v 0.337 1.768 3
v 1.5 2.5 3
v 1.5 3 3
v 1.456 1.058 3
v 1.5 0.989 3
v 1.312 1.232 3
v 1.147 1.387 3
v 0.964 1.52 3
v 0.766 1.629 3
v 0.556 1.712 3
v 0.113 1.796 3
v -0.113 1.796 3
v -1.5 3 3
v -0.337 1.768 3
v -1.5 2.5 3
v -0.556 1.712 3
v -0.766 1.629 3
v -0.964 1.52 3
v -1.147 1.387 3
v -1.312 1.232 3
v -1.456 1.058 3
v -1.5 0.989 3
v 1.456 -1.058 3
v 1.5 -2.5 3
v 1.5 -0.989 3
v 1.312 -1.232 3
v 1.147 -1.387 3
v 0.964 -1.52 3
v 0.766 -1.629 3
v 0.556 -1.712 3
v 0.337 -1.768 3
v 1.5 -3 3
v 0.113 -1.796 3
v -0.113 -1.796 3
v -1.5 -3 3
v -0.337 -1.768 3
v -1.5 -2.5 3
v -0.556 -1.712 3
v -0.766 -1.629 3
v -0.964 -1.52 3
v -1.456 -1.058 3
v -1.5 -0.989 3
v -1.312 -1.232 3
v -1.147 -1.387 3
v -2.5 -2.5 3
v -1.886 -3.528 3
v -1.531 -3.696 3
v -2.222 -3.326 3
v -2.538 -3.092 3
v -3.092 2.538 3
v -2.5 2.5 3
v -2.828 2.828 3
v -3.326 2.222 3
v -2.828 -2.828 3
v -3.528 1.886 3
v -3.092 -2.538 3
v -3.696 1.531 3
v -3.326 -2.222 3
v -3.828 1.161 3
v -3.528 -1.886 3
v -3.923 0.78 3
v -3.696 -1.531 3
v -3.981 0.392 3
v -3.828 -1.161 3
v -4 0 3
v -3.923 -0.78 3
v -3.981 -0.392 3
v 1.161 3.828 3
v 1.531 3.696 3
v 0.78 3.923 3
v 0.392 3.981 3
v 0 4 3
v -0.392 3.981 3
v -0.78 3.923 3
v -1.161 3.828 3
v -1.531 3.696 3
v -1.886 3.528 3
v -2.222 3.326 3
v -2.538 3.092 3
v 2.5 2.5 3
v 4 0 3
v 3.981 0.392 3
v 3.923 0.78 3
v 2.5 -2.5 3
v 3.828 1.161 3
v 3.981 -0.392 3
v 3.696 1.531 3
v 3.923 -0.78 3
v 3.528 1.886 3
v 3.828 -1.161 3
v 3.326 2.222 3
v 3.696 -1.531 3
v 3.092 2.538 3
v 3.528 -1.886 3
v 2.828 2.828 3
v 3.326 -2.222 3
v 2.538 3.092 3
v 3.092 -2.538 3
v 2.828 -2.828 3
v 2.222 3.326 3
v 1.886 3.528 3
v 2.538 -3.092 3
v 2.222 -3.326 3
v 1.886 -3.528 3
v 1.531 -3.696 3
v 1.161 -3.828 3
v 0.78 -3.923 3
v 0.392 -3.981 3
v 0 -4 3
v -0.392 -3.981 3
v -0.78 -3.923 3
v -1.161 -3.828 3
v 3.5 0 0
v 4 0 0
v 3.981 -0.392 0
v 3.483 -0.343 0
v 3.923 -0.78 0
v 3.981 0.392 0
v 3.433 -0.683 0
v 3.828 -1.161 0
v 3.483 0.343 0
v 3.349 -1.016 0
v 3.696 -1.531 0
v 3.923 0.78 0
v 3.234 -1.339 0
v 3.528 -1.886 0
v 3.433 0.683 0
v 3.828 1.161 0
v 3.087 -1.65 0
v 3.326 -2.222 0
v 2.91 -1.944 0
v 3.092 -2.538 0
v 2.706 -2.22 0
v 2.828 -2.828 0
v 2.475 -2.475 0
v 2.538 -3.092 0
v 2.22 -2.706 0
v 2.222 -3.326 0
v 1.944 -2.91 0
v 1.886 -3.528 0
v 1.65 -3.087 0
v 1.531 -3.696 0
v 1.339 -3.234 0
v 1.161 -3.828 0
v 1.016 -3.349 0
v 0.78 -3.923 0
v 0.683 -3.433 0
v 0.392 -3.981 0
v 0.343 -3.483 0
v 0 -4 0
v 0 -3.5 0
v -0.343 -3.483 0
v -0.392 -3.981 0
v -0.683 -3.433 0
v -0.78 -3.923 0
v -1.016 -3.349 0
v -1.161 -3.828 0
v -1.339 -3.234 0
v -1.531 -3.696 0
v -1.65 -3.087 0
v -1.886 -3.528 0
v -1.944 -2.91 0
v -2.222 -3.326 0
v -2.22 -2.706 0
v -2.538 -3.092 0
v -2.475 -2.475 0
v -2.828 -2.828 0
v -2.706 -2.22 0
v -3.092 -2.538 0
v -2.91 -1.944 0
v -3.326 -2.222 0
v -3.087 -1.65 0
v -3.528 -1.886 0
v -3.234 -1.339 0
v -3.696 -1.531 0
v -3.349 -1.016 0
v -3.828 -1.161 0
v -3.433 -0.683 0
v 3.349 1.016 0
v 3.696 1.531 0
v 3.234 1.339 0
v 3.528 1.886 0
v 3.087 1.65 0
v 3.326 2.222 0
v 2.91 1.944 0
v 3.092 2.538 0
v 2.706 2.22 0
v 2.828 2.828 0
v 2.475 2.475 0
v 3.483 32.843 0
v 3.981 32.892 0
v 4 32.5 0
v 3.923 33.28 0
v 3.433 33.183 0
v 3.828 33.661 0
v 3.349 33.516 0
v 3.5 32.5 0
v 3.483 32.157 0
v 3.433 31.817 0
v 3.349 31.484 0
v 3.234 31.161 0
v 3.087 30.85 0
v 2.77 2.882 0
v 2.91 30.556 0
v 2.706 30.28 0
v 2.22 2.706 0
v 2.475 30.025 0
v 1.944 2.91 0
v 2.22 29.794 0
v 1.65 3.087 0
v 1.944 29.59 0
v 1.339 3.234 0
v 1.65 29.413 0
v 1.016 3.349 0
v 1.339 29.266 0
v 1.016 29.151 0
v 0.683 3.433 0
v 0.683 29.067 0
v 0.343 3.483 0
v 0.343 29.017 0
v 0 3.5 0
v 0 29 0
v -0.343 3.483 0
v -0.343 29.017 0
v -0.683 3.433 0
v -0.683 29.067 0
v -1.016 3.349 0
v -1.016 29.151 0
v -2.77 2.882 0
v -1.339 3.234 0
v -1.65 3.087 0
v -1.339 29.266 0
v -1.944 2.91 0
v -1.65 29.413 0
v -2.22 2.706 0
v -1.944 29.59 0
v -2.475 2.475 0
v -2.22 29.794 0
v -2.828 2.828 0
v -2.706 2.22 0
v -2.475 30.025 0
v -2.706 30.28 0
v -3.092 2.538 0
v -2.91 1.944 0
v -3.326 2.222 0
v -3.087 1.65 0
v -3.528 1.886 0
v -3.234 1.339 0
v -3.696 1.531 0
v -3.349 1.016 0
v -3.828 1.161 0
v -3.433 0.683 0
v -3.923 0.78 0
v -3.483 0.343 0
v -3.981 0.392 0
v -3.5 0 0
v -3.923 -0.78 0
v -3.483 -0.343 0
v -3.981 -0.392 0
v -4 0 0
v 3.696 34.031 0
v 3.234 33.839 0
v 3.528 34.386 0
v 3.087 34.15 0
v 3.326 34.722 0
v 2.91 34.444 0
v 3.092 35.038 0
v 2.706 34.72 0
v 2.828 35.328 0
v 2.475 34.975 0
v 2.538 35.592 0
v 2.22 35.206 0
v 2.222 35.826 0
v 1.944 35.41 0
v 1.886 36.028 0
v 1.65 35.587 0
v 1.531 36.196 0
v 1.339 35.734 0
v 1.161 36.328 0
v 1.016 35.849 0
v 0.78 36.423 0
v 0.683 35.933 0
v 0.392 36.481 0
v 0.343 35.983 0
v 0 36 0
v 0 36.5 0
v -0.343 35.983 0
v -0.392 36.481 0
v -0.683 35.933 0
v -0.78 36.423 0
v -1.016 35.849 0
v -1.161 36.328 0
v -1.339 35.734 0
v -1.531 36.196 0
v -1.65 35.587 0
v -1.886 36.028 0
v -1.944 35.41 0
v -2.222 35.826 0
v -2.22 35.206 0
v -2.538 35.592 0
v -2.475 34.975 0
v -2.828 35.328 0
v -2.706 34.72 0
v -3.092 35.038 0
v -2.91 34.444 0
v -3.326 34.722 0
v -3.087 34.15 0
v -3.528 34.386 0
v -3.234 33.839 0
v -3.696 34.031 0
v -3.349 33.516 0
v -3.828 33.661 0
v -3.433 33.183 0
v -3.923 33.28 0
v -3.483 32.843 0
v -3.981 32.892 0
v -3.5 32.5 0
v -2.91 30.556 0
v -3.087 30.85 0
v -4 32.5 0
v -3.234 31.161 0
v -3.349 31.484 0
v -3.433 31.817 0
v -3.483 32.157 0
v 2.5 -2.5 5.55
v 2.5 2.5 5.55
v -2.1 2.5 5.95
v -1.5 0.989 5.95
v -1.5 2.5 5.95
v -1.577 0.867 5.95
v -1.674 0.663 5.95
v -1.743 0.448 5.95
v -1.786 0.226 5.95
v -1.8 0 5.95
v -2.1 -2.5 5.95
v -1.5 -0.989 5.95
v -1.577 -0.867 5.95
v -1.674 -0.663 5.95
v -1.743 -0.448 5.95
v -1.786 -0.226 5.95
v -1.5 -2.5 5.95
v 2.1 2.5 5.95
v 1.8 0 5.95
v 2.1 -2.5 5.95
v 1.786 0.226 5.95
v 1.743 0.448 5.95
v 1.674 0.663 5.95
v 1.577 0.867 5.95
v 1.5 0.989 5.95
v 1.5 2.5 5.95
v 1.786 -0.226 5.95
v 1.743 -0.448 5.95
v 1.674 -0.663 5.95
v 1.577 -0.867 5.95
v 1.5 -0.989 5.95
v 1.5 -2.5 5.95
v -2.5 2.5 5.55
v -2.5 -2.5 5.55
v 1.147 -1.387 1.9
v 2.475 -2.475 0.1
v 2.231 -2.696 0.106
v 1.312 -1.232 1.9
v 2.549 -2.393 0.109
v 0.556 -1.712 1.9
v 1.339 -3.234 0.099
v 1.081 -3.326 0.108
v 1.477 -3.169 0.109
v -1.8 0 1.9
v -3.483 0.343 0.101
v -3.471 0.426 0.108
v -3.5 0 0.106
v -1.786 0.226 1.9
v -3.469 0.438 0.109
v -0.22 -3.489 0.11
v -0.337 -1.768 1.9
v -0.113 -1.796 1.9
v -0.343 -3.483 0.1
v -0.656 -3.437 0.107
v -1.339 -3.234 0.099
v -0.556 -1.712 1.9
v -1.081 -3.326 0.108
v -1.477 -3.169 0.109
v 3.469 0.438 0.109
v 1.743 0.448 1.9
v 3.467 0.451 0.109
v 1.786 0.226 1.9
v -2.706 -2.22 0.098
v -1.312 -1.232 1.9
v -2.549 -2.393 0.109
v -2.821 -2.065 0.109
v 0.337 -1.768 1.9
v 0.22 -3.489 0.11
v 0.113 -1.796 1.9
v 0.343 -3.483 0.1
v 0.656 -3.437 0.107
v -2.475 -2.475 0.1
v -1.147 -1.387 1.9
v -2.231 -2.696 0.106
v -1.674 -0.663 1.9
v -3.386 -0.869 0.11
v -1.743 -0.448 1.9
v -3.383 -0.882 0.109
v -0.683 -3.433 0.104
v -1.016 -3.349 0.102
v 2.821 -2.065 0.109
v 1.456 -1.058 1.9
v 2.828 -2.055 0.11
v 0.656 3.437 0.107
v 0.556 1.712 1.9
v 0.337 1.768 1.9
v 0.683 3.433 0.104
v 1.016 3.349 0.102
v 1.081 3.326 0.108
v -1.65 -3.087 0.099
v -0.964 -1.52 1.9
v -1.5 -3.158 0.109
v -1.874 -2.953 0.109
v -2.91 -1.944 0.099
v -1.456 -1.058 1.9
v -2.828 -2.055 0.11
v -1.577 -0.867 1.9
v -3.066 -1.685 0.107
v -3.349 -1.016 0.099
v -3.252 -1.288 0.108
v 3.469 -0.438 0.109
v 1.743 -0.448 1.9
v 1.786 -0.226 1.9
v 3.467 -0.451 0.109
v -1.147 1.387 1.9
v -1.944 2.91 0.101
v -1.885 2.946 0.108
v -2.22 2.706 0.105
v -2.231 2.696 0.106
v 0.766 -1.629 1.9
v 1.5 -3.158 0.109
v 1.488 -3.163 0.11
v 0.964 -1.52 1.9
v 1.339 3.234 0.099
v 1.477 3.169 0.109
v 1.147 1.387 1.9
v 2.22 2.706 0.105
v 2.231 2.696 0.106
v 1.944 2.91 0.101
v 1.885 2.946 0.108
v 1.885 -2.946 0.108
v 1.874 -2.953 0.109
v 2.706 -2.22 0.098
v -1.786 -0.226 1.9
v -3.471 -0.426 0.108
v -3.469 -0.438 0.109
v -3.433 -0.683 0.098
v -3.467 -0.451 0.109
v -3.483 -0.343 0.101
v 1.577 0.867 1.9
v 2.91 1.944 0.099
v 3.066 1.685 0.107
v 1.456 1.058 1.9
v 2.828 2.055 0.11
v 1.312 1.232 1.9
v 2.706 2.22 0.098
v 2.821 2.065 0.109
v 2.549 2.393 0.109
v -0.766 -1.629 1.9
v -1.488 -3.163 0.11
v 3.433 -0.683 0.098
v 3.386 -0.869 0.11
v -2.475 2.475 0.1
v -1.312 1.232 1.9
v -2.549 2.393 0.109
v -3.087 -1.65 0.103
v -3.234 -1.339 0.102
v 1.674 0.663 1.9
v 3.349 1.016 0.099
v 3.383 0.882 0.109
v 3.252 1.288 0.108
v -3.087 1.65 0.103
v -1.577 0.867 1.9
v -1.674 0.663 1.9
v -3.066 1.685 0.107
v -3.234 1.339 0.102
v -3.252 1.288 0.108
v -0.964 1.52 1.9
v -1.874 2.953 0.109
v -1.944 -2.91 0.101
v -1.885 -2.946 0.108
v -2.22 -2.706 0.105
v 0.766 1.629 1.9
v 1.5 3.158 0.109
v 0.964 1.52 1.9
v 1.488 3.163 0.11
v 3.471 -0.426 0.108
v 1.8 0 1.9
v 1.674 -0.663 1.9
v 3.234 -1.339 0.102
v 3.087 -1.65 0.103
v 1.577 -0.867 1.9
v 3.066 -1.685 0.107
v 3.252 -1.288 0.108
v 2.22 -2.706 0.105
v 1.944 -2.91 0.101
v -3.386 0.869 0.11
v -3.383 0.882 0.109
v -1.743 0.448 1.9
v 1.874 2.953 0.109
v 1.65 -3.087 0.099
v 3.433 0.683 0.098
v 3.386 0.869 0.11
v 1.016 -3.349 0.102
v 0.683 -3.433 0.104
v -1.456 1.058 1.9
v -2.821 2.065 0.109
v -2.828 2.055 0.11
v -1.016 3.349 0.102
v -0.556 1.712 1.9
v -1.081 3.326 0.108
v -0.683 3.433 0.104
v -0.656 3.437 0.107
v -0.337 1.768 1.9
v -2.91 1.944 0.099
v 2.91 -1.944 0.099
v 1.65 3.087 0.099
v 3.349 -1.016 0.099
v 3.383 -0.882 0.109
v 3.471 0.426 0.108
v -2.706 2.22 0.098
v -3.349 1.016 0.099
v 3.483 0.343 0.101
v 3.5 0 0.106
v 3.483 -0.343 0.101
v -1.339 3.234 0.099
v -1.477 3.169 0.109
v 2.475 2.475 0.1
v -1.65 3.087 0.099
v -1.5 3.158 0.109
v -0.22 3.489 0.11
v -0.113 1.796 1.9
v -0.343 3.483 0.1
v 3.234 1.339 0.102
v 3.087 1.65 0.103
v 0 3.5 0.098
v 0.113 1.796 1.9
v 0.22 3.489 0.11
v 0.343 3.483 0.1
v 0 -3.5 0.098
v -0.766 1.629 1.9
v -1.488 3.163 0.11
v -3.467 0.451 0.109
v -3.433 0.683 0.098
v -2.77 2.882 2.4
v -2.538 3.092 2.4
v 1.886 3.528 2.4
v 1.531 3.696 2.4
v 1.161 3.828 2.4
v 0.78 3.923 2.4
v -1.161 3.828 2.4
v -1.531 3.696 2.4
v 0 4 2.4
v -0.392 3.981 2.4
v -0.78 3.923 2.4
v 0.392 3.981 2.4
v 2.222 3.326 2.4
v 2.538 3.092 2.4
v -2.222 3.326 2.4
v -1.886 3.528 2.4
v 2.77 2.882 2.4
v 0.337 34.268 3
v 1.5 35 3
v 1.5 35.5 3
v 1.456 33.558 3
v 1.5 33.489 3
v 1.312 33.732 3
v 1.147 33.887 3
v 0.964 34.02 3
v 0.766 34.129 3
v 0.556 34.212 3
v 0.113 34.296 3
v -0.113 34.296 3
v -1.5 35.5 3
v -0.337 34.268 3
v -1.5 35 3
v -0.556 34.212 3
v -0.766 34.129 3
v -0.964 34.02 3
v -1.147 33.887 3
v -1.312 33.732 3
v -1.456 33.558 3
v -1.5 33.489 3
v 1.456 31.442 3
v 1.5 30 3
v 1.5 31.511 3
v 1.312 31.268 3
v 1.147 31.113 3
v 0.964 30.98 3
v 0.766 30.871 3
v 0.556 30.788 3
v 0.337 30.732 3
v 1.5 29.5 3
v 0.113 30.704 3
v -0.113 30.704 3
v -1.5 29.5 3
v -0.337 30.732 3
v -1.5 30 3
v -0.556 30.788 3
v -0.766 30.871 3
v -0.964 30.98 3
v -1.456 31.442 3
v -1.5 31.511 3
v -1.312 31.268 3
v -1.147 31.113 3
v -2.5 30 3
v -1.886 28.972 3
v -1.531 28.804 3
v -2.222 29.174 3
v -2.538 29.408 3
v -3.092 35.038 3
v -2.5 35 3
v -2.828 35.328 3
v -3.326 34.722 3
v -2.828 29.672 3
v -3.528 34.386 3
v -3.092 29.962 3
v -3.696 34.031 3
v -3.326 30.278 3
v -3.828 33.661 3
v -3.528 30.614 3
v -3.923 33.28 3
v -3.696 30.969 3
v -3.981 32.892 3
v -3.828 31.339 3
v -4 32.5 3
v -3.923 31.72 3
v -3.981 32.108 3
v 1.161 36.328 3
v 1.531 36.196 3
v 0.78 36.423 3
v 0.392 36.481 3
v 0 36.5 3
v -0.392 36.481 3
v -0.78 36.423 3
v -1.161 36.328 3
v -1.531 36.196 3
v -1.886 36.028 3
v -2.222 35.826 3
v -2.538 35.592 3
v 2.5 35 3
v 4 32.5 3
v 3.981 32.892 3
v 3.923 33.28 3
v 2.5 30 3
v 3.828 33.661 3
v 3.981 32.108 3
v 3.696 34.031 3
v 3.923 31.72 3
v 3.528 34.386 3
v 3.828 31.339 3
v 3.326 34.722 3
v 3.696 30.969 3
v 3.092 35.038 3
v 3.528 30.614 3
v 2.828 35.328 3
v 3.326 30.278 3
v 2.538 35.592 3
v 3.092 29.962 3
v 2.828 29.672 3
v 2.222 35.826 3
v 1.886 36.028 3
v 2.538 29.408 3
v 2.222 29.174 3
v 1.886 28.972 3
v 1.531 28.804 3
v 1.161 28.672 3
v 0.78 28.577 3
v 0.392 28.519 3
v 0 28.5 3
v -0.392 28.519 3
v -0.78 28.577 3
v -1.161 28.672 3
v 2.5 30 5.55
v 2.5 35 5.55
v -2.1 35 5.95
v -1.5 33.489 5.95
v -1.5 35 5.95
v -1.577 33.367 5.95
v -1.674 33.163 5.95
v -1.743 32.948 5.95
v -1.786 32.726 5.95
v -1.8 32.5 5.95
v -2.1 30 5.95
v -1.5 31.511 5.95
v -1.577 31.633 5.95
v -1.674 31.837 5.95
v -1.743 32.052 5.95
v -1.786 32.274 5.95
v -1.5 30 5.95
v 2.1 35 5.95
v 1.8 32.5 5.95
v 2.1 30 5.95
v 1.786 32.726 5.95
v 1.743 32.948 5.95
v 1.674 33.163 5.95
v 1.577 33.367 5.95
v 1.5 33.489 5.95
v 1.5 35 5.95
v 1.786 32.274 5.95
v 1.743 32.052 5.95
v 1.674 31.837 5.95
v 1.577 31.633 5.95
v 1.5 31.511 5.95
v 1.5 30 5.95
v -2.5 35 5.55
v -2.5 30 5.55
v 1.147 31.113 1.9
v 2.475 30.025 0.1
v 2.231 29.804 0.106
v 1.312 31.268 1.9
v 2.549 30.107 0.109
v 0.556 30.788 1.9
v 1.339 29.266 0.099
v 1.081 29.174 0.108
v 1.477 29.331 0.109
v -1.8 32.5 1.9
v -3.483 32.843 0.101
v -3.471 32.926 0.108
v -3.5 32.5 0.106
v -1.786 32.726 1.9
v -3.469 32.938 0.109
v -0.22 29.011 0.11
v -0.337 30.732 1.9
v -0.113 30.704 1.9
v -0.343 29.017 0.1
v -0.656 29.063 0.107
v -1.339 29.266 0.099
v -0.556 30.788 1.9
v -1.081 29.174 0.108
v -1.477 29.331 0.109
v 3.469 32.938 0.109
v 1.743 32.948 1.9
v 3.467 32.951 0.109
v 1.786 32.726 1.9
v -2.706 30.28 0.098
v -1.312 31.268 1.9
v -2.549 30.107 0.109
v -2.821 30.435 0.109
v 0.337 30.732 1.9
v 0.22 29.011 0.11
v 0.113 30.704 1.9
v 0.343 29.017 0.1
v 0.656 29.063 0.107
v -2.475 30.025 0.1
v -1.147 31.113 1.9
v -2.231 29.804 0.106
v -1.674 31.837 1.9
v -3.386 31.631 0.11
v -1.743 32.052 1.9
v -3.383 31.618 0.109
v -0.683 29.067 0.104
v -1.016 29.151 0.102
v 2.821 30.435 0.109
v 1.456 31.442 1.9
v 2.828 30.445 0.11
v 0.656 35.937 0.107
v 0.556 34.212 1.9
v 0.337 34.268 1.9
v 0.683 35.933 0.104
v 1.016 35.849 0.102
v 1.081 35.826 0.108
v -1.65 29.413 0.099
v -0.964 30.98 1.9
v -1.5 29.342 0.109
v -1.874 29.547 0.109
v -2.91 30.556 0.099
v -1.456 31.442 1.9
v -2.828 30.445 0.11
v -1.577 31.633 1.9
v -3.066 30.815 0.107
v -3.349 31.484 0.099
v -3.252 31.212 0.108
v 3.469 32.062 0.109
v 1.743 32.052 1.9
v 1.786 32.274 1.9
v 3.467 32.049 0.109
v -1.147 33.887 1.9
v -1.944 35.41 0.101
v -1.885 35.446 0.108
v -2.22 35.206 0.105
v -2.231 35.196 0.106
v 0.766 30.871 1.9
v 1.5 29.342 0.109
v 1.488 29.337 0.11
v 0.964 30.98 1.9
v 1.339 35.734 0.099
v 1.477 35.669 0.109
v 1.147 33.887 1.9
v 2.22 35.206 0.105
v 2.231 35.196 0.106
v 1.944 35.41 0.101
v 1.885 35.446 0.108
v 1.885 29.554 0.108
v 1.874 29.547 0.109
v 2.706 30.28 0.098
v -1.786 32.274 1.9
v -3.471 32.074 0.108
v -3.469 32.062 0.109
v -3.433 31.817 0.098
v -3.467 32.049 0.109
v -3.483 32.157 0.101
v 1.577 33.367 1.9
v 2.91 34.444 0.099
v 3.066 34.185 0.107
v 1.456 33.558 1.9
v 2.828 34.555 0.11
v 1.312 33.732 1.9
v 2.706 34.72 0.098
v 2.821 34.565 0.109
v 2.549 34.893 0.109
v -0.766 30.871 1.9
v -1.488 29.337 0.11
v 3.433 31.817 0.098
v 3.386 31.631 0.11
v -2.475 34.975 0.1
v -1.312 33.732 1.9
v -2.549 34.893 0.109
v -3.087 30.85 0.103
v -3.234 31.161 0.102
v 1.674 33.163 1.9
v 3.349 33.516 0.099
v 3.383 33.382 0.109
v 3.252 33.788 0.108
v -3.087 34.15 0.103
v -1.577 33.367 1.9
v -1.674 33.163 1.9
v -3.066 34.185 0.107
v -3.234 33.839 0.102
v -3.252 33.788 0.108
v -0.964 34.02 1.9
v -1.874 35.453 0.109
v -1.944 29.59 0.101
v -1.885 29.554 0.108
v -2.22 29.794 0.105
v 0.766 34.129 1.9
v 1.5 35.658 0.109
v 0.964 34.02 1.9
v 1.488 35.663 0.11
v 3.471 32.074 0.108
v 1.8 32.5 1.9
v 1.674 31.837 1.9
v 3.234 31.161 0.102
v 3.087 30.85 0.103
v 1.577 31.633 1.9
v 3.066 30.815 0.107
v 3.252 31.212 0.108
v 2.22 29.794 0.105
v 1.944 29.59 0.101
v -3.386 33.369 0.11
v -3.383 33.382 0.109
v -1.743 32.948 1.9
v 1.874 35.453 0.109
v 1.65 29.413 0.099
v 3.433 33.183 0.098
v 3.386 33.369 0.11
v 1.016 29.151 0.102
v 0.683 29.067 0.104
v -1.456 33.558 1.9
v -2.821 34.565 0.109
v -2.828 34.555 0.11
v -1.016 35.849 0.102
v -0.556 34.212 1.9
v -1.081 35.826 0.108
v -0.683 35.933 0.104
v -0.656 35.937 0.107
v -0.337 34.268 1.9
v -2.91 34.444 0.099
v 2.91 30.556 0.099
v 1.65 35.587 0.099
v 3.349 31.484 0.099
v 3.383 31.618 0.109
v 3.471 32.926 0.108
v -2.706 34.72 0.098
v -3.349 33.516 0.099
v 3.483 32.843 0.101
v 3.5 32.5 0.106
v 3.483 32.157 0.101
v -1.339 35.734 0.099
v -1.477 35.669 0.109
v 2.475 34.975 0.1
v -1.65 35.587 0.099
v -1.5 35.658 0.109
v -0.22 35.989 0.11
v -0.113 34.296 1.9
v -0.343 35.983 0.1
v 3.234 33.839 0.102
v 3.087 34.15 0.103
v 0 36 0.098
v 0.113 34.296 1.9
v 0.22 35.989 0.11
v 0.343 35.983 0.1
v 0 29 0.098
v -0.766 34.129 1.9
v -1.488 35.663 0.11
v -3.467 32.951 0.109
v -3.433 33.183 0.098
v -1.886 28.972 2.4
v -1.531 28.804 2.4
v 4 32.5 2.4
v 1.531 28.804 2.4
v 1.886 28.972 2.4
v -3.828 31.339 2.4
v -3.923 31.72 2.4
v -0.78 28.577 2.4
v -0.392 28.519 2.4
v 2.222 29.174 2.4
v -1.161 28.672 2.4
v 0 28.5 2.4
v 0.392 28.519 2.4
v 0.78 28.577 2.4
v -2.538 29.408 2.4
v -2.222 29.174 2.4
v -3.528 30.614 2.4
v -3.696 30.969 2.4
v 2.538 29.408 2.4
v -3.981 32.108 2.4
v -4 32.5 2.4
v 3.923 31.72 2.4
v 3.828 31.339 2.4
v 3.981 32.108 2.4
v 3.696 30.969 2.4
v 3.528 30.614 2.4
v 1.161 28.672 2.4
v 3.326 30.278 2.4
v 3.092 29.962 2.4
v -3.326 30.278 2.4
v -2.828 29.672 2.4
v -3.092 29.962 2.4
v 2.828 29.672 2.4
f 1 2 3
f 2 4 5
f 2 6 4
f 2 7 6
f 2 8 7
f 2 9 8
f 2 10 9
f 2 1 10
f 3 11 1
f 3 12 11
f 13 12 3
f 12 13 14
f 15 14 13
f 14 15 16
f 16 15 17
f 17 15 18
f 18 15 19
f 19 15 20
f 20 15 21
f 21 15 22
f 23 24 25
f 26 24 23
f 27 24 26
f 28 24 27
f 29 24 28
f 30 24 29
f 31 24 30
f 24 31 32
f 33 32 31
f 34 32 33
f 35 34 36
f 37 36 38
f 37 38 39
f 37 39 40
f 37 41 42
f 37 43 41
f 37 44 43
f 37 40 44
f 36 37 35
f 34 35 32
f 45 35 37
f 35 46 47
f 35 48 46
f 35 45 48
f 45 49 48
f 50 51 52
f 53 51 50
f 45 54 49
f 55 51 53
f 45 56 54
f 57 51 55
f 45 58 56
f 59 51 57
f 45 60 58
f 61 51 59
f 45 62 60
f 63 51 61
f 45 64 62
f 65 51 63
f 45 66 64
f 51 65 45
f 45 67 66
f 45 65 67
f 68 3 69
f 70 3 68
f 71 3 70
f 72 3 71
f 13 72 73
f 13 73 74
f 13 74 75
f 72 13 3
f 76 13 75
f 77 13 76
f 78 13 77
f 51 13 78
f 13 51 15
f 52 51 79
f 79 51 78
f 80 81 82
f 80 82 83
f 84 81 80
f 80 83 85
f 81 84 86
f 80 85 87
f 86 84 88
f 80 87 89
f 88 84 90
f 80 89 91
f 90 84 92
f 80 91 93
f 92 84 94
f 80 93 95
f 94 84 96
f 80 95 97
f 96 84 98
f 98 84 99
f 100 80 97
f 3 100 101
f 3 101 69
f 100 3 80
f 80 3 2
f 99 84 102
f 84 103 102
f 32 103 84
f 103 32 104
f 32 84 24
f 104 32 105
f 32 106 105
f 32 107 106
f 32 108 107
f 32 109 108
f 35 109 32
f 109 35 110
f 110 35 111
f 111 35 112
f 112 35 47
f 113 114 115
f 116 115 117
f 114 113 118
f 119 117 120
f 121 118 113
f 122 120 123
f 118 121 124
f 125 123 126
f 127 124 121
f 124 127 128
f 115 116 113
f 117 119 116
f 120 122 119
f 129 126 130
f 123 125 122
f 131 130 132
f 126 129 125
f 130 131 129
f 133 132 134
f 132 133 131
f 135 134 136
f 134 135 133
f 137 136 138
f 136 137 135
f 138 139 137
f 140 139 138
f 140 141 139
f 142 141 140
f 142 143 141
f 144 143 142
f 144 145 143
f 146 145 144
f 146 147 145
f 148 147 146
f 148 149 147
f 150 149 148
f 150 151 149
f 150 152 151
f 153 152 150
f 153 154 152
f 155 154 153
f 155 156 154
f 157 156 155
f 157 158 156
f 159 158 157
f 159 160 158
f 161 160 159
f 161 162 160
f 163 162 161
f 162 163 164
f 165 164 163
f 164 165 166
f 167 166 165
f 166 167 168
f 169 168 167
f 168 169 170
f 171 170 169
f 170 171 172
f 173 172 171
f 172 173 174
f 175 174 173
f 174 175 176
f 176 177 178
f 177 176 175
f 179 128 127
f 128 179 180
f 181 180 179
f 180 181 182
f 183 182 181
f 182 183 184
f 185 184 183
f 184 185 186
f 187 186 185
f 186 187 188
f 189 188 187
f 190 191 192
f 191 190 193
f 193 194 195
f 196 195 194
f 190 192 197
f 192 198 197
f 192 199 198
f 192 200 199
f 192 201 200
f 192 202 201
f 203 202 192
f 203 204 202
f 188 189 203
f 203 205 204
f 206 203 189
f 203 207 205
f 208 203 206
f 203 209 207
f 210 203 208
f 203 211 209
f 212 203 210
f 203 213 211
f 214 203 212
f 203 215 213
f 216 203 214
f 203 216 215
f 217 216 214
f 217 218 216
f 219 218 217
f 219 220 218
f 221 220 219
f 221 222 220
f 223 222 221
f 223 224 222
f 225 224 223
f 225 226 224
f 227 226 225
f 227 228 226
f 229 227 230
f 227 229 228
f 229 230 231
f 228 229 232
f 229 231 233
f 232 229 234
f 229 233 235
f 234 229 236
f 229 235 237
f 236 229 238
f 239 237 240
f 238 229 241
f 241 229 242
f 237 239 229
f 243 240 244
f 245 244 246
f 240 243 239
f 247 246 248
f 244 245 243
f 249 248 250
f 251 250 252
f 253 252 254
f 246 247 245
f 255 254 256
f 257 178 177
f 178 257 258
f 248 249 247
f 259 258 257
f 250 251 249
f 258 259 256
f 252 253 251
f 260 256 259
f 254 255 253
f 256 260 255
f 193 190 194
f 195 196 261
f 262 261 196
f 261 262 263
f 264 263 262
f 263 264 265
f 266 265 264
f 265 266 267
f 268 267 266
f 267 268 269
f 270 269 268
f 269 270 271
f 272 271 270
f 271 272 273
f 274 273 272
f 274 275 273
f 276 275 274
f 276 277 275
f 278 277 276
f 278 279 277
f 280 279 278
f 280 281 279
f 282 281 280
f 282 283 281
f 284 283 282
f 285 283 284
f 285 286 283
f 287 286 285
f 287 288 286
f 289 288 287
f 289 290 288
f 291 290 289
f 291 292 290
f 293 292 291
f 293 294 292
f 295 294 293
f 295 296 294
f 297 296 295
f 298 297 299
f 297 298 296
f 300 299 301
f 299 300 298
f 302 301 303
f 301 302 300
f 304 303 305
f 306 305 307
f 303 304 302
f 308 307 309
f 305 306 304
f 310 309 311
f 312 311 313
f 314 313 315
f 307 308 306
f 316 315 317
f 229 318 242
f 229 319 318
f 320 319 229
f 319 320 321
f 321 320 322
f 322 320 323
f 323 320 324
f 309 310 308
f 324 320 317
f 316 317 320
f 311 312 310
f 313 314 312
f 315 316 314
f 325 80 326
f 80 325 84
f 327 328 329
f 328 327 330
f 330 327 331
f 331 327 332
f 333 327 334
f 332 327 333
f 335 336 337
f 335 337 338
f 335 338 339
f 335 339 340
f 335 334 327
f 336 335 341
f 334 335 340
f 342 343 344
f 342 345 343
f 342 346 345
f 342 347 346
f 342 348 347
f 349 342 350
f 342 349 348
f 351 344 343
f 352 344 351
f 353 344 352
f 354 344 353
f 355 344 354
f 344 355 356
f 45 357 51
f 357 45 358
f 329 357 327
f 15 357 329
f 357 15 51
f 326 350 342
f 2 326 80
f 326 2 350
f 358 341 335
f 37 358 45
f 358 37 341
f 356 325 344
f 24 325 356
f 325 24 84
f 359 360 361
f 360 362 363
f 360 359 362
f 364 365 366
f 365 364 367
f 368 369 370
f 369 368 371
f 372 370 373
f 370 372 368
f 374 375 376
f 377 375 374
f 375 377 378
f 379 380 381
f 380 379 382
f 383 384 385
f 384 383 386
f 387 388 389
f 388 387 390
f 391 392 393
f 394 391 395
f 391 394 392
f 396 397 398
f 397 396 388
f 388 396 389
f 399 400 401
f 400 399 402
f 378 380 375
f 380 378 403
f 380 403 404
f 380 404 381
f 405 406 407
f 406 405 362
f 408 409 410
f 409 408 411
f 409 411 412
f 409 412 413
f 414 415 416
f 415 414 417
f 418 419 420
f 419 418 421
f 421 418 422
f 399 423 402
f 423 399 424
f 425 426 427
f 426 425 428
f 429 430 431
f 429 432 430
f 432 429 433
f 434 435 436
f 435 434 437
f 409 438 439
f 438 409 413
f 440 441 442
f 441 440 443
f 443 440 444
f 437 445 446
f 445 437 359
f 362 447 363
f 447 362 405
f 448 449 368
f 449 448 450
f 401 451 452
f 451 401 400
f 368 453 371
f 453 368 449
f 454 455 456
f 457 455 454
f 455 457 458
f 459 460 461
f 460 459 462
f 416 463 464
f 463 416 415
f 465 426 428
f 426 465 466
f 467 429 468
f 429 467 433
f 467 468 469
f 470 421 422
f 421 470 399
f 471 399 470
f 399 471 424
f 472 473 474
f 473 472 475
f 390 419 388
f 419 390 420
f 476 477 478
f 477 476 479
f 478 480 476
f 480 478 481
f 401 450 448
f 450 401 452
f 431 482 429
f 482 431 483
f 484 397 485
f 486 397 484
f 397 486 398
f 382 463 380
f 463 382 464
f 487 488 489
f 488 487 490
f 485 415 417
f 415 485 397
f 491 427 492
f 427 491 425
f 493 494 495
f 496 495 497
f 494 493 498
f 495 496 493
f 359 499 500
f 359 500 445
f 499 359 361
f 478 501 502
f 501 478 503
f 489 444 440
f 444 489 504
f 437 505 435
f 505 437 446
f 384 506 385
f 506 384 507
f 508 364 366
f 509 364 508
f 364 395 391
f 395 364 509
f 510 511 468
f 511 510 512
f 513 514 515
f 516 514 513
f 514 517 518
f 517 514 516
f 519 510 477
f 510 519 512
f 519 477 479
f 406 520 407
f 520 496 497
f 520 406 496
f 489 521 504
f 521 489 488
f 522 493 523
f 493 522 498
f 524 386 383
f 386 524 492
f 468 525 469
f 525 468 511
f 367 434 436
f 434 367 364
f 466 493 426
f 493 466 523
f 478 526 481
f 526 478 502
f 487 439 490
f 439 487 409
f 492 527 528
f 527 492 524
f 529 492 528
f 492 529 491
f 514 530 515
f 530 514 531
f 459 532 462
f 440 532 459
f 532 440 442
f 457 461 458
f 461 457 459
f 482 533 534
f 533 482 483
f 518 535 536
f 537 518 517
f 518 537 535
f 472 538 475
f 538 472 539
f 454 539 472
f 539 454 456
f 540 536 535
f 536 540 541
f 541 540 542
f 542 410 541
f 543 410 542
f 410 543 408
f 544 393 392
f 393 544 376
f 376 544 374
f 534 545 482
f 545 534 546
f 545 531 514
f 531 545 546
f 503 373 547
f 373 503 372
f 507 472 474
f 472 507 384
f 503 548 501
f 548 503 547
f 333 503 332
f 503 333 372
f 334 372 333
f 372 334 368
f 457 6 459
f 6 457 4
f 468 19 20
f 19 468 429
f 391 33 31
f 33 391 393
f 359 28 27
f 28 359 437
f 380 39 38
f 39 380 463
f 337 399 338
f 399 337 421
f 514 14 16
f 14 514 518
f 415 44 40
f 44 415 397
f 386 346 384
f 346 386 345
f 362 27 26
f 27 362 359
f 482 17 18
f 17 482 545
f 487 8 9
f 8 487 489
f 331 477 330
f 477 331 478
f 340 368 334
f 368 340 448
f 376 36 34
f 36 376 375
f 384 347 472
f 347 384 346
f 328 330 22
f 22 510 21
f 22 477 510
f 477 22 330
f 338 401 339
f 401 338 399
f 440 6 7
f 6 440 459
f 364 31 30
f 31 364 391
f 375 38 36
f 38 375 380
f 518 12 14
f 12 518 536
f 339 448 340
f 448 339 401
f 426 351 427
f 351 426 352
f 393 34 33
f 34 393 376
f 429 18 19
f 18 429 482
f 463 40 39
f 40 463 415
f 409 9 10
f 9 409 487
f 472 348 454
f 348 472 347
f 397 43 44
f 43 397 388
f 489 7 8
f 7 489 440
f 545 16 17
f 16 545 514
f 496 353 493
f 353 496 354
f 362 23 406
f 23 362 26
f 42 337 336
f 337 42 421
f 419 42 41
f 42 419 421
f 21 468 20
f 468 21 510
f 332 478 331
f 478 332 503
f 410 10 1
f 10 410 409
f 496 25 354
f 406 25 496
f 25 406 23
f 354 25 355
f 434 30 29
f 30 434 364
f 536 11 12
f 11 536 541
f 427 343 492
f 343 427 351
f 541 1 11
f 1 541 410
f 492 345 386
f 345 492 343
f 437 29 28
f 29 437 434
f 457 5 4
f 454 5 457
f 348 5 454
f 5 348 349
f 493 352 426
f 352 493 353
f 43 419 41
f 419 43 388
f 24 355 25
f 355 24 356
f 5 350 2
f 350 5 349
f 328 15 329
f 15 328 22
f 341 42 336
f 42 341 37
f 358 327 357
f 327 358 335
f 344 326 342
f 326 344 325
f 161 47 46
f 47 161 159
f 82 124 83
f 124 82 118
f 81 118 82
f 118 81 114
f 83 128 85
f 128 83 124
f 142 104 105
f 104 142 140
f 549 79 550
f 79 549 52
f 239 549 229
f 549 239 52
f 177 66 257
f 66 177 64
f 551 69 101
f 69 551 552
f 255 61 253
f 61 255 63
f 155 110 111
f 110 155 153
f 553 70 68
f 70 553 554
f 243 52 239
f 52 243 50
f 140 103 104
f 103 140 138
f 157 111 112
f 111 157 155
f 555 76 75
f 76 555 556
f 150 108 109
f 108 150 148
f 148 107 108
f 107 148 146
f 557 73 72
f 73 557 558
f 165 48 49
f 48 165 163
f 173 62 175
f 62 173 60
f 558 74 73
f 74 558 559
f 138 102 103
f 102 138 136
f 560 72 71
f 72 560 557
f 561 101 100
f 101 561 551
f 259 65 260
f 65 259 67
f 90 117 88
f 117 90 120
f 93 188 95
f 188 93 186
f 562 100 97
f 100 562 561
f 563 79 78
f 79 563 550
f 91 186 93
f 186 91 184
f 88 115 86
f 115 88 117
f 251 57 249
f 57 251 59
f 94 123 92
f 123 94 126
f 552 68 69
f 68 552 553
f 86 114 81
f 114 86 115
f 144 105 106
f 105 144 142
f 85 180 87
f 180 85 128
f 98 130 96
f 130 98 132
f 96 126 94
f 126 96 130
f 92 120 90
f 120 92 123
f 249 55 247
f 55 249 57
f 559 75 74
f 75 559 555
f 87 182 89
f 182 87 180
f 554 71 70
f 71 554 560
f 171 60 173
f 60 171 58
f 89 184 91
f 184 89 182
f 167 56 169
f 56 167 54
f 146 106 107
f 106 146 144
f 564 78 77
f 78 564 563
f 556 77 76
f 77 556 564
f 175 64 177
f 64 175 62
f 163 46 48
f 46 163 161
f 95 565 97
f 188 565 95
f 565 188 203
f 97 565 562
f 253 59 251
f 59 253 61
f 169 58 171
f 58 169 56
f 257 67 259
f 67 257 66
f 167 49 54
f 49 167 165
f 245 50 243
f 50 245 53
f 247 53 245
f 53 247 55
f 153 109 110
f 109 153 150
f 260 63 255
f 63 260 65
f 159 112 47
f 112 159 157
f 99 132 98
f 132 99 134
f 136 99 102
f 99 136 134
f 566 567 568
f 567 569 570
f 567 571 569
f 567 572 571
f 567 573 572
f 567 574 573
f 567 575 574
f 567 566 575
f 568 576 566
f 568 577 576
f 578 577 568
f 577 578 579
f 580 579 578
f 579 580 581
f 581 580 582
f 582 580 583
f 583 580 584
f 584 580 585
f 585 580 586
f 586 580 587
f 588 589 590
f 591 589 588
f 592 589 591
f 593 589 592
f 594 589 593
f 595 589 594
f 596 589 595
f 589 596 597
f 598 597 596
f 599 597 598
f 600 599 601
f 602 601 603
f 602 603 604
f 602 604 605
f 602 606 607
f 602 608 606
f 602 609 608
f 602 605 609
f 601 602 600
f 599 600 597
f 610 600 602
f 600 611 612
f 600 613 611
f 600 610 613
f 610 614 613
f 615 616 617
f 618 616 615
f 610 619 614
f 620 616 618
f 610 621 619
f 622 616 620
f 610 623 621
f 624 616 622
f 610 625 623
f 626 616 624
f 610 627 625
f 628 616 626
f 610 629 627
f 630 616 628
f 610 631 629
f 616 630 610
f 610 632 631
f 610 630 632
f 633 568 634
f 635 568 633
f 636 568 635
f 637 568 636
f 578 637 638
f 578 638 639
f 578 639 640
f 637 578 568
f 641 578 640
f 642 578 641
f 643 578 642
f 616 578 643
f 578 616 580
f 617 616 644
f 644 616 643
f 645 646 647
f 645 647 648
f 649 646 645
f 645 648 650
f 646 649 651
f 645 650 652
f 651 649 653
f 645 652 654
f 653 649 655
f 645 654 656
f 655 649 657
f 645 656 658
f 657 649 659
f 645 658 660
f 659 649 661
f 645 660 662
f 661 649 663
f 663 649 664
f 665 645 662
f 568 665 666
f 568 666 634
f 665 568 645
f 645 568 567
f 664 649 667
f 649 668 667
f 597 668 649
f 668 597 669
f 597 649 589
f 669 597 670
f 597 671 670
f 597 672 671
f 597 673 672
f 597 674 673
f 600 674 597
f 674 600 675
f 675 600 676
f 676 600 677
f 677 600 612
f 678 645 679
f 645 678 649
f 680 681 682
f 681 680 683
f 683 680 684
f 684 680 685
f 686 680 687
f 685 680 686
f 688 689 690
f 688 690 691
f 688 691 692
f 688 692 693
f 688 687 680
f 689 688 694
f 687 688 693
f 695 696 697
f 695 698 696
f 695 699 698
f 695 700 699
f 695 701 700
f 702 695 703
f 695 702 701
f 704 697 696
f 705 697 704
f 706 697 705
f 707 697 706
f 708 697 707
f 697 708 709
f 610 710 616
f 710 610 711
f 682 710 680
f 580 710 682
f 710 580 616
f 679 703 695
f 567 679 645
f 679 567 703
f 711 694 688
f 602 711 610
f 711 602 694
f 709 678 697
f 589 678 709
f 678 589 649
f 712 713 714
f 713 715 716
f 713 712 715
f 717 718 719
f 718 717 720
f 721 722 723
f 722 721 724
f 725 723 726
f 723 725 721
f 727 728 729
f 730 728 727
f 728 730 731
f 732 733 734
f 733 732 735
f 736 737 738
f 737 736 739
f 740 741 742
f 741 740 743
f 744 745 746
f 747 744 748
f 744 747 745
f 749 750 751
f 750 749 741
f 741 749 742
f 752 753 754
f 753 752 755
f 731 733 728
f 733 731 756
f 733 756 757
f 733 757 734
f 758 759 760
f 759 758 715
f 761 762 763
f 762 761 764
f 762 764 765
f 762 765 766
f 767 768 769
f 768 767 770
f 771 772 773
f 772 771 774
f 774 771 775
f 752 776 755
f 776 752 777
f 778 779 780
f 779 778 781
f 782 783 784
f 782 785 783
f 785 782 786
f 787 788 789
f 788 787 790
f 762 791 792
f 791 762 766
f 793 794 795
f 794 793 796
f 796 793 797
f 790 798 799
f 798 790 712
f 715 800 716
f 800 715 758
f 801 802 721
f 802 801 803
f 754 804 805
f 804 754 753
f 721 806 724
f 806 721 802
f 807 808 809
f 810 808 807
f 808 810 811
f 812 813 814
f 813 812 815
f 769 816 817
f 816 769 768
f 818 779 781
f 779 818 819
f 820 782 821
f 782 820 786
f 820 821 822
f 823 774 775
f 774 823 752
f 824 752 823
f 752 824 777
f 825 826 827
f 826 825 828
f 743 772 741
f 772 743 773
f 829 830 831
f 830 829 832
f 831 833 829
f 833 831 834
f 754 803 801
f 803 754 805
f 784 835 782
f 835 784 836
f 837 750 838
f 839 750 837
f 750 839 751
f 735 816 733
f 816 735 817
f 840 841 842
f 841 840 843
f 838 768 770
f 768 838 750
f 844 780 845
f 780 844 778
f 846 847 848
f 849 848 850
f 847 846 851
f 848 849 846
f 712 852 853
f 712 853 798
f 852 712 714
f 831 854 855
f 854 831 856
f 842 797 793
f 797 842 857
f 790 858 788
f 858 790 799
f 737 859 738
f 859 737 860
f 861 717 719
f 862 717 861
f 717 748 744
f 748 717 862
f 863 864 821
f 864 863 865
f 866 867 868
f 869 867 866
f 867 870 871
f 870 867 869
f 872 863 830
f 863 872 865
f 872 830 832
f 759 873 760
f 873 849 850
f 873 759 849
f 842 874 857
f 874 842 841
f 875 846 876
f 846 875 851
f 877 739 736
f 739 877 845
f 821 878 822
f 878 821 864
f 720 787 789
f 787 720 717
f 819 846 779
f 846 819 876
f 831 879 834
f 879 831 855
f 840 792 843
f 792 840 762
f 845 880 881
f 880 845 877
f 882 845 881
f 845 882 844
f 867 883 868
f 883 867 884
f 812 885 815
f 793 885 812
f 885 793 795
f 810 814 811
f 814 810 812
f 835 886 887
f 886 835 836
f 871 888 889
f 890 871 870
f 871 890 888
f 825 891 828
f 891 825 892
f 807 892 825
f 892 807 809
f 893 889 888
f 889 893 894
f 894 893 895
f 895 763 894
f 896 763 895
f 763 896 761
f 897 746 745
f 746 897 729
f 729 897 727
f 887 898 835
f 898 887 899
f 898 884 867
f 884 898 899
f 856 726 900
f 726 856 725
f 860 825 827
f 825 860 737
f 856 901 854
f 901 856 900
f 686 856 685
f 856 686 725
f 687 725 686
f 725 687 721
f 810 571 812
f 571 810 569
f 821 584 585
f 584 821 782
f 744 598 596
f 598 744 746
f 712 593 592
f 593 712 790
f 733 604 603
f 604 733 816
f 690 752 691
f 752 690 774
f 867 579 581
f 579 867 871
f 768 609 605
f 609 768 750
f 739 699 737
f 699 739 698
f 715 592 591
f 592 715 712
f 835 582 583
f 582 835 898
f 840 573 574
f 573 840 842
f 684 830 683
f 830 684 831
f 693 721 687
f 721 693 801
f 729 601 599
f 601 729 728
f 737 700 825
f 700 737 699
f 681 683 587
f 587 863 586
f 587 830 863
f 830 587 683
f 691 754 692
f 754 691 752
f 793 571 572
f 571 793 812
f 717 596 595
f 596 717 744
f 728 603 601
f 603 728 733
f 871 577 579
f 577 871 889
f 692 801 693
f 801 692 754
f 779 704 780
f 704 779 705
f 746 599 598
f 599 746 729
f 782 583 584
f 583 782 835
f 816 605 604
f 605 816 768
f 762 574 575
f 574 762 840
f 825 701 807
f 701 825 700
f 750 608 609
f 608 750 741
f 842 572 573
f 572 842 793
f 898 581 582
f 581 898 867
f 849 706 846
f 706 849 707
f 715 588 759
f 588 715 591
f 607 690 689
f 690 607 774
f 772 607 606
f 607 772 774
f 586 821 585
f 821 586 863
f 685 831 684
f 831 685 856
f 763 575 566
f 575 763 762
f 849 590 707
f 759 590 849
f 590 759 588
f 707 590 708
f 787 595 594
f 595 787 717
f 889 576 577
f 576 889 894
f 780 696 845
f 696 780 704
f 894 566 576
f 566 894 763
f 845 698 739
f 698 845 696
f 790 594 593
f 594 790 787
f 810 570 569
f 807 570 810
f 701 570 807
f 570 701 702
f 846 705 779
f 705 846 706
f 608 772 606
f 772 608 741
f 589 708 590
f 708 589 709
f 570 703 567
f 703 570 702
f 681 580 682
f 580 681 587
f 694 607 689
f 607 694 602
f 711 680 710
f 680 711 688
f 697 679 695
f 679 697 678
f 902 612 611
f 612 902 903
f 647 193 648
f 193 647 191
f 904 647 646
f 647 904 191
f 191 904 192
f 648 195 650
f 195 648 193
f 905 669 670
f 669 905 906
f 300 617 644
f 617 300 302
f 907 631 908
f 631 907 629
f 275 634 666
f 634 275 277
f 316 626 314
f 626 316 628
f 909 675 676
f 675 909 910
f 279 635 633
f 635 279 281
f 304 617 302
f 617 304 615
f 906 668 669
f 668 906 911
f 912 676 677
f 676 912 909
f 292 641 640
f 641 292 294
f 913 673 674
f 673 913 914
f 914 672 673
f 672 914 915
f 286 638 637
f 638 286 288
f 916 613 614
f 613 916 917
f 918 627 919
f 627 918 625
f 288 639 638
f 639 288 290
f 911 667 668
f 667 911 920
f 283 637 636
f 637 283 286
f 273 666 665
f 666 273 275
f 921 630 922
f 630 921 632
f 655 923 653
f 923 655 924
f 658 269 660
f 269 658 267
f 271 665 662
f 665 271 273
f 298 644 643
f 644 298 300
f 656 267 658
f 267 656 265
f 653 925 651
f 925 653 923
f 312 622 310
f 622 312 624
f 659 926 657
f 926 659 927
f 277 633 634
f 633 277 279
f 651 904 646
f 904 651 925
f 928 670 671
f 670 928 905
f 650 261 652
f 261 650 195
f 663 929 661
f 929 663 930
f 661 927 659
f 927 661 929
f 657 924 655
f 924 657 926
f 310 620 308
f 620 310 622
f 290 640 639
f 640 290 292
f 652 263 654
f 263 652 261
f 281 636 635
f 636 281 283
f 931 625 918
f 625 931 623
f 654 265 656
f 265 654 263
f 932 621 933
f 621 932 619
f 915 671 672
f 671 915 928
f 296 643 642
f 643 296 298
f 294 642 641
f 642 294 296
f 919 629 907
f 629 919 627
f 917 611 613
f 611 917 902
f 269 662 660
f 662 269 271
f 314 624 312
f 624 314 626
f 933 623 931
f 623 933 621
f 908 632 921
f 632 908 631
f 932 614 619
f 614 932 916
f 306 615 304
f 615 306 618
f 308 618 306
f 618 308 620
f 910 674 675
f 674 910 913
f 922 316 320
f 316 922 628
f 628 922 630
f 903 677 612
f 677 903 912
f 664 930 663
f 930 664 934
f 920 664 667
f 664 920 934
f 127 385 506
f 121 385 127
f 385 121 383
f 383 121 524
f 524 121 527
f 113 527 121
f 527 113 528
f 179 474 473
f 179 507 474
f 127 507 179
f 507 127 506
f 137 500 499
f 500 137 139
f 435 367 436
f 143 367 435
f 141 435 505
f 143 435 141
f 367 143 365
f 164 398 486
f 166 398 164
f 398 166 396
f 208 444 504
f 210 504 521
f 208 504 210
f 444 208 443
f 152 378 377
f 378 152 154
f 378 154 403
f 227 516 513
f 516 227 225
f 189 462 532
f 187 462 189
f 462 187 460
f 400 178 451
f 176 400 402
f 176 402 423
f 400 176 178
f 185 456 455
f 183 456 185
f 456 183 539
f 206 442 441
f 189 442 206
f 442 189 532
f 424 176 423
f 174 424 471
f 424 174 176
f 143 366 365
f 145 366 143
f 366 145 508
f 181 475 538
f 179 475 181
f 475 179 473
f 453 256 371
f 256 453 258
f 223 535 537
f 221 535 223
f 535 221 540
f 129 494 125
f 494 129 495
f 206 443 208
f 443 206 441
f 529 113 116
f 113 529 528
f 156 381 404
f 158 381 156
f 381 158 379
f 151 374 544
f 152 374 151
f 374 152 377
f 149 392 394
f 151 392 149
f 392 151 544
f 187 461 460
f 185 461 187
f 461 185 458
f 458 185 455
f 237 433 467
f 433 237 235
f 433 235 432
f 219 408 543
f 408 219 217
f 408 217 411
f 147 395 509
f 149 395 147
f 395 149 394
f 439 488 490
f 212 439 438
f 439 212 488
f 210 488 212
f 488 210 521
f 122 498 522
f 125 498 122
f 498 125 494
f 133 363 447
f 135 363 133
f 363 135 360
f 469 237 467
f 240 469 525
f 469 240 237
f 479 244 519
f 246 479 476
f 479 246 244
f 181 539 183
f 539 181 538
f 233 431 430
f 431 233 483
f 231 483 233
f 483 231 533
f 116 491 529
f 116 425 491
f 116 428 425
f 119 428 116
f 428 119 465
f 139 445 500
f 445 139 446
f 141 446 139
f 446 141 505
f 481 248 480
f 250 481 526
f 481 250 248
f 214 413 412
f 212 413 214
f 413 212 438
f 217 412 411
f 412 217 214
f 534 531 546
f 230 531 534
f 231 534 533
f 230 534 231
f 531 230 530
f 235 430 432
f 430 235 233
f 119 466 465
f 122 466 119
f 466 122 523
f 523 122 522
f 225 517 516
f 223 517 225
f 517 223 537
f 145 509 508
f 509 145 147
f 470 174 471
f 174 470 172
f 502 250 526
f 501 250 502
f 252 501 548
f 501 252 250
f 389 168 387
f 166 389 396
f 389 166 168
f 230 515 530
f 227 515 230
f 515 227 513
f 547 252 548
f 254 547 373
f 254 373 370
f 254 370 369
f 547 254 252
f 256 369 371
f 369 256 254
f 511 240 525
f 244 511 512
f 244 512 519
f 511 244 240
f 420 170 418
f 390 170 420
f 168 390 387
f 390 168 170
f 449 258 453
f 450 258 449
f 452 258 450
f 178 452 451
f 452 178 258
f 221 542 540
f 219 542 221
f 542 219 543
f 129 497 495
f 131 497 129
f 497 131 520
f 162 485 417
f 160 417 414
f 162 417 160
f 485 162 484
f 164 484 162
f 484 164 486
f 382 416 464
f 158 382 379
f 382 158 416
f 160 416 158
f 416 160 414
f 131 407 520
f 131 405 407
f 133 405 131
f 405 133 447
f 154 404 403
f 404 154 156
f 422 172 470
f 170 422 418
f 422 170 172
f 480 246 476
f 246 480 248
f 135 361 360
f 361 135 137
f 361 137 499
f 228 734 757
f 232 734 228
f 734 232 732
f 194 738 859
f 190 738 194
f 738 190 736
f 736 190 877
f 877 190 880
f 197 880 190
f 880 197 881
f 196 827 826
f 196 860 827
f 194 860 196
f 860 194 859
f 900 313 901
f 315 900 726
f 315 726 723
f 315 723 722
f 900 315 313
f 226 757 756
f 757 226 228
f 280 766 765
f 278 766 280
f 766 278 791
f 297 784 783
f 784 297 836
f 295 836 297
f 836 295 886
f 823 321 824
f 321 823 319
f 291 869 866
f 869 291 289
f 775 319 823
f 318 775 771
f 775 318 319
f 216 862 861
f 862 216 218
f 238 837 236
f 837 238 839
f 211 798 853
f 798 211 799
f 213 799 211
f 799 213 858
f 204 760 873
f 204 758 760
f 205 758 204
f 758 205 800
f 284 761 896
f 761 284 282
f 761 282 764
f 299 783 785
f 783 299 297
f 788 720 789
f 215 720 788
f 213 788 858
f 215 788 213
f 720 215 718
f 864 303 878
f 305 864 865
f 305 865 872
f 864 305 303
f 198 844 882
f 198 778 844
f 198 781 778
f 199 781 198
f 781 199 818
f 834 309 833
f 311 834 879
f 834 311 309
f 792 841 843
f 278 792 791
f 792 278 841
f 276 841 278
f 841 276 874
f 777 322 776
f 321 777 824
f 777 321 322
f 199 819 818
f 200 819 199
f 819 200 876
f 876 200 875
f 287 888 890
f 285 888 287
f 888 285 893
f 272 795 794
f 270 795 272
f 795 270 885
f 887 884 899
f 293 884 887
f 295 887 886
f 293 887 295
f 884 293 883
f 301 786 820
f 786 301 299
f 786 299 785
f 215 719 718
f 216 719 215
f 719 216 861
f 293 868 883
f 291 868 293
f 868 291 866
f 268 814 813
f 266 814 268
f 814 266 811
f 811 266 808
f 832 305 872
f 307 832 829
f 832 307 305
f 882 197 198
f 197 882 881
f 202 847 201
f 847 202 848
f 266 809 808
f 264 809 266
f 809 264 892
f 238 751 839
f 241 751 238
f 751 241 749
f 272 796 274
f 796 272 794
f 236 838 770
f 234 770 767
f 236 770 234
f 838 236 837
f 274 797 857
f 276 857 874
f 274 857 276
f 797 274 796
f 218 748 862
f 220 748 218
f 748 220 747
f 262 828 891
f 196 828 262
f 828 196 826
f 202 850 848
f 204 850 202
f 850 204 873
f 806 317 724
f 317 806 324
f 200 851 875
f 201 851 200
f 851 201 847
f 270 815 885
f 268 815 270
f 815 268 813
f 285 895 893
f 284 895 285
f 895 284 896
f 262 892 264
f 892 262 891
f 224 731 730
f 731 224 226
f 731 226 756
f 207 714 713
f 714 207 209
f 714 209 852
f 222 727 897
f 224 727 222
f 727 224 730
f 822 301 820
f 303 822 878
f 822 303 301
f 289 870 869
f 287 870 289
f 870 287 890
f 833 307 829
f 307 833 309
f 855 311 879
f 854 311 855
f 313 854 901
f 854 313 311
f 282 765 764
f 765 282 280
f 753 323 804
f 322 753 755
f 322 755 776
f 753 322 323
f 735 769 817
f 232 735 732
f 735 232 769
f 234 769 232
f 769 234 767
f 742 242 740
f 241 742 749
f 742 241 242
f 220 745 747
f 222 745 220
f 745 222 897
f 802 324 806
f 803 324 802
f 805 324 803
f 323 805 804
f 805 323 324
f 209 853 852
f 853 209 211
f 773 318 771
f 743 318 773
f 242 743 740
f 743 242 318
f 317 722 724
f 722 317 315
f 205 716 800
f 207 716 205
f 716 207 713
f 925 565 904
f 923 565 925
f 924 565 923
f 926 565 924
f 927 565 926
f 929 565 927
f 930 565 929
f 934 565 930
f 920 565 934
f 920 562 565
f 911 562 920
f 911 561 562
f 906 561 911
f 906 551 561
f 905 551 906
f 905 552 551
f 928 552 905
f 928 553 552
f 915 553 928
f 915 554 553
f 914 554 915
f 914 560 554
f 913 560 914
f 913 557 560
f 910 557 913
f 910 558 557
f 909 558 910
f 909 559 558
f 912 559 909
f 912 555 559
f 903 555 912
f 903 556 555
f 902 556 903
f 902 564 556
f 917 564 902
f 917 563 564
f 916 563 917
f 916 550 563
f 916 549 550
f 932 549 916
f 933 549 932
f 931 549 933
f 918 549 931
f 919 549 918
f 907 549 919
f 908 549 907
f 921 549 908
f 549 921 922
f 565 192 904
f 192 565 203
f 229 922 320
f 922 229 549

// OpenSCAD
// file: native_adapter.scad
$fn = 50;

difference() {
	union() {
		translate(v = [0, 0, 0]) {
			rotate(a = [0, 0, 0]) {
				difference() {
					union() {
						translate(v = [-0.35, 0, 0]) {
							hull() {
								translate(v = [-4.4, 4.25, 0]) {
									cylinder(h = 3.0, r = 0.75);
								}
								translate(v = [4.4, 4.25, 0]) {
									cylinder(h = 3.0, r = 0.75);
								}
								translate(v = [-4.4, -4.25, 0]) {
									cylinder(h = 3.0, r = 0.75);
								}
								translate(v = [4.4, -4.25, 0]) {
									cylinder(h = 3.0, r = 0.75);
								}
							}
						}
						translate(v = [-2.5, -2.5, 2.95]) {
							cube(size = [5.0, 5.0, 3.0]);
						}
					}
					union() {
						translate(v = [0, 0, 0]) {
							rotate(a = [0, 180, 0]) {
								difference() {
									union() {
										translate(v = [0, 0, -20.0]) {
											cylinder(h = 20.0, r = 1.5);
										}
										translate(v = [0, 0, -1.9]) {
											cylinder(h = 1.9, r1 = 1.8, r2 = 3.6);
										}
										cylinder(h = 250, r = 3.6);
										translate(v = [0, 0, -20.0]) {
											cylinder(h = 20.0, r = 1.8);
										}
										translate(v = [0, 0, -20.0]) {
											cylinder(h = 20.0, r = 1.5);
										}
									}
									union();
								}
							}
						}
						translate(v = [-1.5, -3.0, 3.0]) {
							cube(size = [3.0, 6.0, 3.0500000000000003]);
						}
						translate(v = [0, 2.6, 0]) {
							rotate(a = [90, 0, 0]) {
								linear_extrude(height = 5.2) {
									polygon(points = [[-2.7, 5.3500000000000005], [-1.9, 6.15], [-2.7, 6.15]]);
								}
							}
						}
						translate(v = [0, 2.6, 0]) {
							rotate(a = [90, 0, 0]) {
								linear_extrude(height = 5.2) {
									polygon(points = [[2.7, 5.3500000000000005], [1.9, 6.15], [2.7, 6.15]]);
								}
							}
						}
						translate(v = [-4.6, -5.5, -0.1]) {
							cylinder(h = 3.2, r = 3.15);
						}
						translate(v = [-4.6, 5.5, -0.1]) {
							cylinder(h = 3.2, r = 3.15);
						}
						translate(v = [4.6, -5.5, -0.1]) {
							cylinder(h = 3.2, r = 3.15);
						}
						translate(v = [4.6, 5.5, -0.1]) {
							cylinder(h = 3.2, r = 3.15);
						}
					}
				}
			}
		}
	}
	union();
}
// file: beam_joint_geometry.scad
$fn=64;
tie_t=2.4;
module native_adapter(){
include <native_adapter.scad>
}

module joint_bores(holes,wood) {
  // Leave the OOBB countersink and pilot cheeks of each native adapter intact.
  for(p=holes) translate([p[0],p[1],-.05]) cylinder(d=7,h=tie_t+.1);
  if(len(wood)) translate(wood) {
    translate([0,0,-.05]) cylinder(d=4,h=tie_t+.1);
    translate([0,0,-.01]) cylinder(d1=7.02,d2=4,h=1.51);
  }
}

module foot(p,r) { translate(p) circle(r=r); }
module strap(a,b,ra,rb) { hull(){ foot(a,ra); foot(b,rb); } }
module beam_joint(holes,spine=[],wood=[]) {
  union(){
    for(p=holes) translate(p) intersection(){
      native_adapter();
      cylinder(r=4,h=12);
    }
    difference(){
      linear_extrude(tie_t) union(){
        if(len(wood)) strap(holes[0],wood,4,4.6);
        else if(len(spine)==0) strap(holes[0],holes[1],4,4);
        else {
          strap(spine[0],spine[1],2.65,2.65);
          for(p=holes) strap(p,[spine[0][0],p[1]],4,2.65);
        }
      }
      joint_bores(holes,wood);
    }
  }
}
// main file
include <beam_joint_geometry.scad>
beam_joint([[0, 0], [0, 32.5]],[-0.9, -3.9, 9.6, 36.4],[],[[4.6, 5.5, 5.5, 2.05], [4.6, 15.5, 17.0, 2.05], [4.6, 27.0, 27.0, 2.05]]);
